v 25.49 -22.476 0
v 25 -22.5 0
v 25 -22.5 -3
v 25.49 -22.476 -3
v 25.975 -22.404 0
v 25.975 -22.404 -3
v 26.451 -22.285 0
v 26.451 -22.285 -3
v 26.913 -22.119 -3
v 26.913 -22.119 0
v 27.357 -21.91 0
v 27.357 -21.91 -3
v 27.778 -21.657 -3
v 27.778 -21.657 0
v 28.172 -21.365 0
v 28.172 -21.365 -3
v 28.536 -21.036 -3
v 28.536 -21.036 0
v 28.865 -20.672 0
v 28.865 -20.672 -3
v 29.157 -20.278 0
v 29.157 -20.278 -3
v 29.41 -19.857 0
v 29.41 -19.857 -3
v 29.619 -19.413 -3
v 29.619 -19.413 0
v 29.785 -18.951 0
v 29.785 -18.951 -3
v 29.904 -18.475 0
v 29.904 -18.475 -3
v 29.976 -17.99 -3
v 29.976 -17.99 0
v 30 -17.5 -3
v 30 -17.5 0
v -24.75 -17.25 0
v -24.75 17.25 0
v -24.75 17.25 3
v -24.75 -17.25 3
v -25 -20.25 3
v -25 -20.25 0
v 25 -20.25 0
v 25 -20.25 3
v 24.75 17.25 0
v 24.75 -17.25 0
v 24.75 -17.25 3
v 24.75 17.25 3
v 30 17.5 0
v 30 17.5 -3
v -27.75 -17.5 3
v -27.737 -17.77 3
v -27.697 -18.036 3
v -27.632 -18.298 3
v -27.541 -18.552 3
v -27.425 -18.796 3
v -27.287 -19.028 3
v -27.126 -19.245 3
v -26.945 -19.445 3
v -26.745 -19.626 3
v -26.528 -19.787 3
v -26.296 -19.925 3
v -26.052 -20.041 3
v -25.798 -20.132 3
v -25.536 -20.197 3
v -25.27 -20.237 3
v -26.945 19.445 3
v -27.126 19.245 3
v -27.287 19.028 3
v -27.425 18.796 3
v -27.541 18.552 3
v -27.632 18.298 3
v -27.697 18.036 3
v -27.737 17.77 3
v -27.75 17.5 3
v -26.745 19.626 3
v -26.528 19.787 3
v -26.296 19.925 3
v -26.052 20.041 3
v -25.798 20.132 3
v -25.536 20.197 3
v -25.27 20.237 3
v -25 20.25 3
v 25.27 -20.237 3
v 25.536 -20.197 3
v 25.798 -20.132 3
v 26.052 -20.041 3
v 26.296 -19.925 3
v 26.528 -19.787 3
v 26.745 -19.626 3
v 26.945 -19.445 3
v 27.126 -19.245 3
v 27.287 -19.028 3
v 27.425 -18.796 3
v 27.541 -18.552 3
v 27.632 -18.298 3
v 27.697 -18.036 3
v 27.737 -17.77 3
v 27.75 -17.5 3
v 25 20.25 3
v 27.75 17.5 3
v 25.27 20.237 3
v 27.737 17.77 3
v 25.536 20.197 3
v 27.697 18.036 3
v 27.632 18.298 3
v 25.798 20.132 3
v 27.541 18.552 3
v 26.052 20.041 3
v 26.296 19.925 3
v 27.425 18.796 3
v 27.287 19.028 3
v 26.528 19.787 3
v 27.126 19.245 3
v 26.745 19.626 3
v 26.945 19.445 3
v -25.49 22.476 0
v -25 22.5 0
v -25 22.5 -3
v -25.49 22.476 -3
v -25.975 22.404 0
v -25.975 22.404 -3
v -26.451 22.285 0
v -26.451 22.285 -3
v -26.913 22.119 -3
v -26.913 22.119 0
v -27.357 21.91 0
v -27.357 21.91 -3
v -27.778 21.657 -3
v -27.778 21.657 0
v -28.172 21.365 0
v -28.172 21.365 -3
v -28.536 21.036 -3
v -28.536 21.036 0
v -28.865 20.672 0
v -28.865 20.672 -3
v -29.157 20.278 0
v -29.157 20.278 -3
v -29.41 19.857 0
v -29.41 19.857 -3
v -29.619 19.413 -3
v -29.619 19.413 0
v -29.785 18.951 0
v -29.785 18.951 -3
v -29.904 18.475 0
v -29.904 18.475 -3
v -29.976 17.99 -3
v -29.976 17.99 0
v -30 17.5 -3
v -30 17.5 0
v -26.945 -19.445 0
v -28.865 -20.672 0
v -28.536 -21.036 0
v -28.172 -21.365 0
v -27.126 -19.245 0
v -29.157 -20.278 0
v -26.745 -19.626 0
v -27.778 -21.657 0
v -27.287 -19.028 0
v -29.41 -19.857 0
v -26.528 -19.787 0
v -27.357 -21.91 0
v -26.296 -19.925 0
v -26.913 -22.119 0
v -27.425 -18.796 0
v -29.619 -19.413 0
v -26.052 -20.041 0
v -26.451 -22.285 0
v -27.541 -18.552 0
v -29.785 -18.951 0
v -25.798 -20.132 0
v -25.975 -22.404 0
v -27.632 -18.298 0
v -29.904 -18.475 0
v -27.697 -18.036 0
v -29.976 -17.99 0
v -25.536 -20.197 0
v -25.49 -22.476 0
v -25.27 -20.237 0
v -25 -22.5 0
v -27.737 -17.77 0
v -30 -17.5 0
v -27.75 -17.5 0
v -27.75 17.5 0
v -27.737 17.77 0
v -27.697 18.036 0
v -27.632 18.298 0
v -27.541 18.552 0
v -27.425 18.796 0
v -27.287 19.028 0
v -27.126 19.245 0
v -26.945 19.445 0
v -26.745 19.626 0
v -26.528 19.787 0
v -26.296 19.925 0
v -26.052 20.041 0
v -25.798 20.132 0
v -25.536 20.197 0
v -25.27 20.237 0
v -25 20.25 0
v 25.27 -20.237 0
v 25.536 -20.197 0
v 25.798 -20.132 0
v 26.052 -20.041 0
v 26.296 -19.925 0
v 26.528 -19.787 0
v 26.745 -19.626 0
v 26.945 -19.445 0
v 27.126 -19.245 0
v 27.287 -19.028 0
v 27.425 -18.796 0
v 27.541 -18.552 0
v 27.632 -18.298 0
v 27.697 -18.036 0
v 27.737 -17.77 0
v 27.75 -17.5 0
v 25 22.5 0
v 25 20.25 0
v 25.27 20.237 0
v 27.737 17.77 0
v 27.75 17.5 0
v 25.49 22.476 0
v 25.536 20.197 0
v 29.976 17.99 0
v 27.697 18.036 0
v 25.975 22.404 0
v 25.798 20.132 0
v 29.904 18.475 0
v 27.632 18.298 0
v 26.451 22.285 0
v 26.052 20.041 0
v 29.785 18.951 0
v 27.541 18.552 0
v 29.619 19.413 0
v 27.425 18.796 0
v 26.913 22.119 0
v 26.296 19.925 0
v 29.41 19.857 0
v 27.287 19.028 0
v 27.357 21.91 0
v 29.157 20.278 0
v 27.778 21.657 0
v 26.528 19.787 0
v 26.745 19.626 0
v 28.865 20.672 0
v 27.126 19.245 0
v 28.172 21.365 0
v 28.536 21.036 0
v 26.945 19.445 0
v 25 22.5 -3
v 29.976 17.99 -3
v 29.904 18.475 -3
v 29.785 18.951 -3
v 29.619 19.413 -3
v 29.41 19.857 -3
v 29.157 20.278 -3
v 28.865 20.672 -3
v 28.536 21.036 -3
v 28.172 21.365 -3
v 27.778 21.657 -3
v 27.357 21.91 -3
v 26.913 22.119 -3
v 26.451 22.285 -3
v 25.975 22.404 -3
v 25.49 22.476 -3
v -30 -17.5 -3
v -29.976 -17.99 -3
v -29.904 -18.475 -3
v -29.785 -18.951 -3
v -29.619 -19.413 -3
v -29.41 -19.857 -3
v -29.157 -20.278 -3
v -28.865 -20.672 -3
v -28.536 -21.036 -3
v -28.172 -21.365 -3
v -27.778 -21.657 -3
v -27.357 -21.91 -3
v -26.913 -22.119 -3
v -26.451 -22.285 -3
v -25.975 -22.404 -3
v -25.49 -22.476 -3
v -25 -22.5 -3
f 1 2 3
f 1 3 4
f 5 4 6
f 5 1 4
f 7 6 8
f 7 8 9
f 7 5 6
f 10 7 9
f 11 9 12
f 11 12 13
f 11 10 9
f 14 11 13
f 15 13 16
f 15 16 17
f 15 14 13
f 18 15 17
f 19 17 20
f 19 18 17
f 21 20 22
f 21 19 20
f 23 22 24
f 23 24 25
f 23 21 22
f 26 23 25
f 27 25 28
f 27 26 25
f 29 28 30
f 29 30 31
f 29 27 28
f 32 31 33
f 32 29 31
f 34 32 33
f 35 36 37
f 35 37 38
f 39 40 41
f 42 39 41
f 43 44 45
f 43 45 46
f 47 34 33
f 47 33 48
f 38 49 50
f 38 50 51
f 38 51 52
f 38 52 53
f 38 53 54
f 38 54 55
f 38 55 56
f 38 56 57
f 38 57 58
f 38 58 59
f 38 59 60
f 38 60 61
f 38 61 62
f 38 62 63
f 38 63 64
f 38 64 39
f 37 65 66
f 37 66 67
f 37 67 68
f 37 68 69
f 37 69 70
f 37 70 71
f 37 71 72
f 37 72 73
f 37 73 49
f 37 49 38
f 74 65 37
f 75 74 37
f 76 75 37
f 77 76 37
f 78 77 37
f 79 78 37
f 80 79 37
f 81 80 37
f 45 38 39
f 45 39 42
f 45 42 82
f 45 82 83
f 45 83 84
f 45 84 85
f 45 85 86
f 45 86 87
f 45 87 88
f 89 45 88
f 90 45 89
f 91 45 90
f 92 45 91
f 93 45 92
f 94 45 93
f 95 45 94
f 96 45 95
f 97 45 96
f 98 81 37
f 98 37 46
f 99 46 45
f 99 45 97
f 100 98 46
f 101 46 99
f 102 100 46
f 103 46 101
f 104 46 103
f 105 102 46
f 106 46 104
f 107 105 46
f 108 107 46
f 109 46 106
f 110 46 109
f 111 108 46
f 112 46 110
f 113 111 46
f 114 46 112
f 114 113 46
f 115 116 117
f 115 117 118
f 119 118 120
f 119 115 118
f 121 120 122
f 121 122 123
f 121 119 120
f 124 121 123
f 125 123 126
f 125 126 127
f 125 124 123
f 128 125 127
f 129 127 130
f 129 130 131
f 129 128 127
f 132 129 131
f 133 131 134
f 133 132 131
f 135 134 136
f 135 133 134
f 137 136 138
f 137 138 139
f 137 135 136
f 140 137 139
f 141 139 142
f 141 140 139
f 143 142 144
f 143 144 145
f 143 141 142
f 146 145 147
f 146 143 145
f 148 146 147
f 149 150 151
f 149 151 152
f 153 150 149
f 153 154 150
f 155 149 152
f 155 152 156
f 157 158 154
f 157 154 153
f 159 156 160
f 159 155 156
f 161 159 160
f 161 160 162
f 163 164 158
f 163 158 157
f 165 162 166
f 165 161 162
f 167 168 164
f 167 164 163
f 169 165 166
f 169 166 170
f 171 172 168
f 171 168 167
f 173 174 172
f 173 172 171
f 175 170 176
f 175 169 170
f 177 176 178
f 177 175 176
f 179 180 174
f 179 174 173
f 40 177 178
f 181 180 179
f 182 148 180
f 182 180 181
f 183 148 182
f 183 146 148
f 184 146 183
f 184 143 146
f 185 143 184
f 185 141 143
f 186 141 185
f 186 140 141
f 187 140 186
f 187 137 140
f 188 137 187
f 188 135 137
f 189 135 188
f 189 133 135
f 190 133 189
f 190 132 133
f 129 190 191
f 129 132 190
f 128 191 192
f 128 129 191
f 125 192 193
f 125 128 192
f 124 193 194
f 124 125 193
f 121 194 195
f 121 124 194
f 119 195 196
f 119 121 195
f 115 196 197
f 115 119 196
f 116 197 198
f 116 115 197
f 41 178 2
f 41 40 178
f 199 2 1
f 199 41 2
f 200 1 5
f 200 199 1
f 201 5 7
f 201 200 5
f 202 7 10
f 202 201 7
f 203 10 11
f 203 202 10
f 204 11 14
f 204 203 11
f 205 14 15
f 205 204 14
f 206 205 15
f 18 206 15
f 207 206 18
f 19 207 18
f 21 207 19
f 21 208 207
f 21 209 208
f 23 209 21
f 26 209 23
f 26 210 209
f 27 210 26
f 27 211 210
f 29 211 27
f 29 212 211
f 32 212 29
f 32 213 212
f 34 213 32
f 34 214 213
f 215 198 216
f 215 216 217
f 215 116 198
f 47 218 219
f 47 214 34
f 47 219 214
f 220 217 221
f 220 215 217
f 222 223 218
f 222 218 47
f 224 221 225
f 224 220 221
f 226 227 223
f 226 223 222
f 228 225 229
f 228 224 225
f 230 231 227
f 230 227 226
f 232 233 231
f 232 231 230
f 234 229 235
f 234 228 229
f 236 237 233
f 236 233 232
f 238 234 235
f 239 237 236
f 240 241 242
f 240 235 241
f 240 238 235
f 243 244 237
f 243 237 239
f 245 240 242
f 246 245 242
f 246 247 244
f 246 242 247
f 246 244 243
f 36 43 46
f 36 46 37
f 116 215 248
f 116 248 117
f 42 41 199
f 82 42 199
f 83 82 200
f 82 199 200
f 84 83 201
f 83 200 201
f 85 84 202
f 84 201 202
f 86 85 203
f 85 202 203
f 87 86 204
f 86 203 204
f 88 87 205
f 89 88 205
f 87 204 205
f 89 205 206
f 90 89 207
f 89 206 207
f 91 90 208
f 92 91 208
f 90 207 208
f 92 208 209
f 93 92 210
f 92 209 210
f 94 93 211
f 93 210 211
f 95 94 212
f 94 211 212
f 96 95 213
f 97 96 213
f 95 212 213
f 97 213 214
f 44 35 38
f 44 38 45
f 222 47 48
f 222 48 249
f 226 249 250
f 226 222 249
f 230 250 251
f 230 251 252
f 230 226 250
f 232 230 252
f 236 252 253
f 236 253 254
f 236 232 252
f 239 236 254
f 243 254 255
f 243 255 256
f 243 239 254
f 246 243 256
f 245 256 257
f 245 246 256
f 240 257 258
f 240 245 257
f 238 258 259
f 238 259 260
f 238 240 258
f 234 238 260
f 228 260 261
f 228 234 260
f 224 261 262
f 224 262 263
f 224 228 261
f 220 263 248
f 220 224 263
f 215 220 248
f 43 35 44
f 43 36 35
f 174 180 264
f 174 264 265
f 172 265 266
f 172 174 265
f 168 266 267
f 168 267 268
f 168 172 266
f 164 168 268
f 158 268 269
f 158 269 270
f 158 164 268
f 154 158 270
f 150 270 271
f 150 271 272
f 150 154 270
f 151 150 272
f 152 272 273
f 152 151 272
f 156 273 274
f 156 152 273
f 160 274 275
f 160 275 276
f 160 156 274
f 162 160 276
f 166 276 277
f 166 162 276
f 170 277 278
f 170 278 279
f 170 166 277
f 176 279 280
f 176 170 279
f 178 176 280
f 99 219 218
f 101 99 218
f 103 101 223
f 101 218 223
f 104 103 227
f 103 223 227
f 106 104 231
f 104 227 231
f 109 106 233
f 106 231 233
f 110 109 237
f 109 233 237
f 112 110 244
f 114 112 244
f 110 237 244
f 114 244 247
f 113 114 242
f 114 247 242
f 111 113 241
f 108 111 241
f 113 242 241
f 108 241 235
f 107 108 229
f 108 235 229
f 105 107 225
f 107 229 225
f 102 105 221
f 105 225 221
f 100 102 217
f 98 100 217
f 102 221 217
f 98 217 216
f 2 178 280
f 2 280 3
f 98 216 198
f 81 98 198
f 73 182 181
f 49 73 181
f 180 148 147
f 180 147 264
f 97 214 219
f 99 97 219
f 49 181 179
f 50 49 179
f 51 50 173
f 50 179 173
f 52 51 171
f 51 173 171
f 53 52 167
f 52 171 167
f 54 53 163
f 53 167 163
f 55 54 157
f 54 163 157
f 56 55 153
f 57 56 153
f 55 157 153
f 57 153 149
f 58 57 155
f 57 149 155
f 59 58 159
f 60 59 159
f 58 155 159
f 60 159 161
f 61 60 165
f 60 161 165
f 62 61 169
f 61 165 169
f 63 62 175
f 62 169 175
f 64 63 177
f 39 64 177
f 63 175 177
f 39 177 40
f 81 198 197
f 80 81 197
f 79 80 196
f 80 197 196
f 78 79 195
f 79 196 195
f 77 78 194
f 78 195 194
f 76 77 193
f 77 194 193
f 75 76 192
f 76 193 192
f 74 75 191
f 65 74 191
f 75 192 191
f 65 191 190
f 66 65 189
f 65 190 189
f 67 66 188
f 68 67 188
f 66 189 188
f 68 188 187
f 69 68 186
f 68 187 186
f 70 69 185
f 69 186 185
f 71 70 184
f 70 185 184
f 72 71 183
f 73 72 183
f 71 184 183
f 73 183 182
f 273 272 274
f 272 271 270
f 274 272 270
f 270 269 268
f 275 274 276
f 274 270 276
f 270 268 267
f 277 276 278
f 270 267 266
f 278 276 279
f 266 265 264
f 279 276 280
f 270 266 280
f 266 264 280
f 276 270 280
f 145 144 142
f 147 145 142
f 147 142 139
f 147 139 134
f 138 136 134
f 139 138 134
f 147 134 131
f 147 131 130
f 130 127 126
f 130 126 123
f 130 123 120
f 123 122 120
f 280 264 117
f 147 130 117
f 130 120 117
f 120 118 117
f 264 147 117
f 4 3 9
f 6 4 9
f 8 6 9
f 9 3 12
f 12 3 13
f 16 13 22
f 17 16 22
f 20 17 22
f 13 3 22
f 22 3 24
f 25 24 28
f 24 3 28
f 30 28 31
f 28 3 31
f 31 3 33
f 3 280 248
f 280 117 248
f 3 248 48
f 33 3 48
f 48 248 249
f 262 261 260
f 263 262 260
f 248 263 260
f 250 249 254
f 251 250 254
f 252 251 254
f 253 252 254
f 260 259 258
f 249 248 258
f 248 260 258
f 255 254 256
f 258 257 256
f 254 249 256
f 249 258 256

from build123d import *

# Parameters (mm, degrees)
F1_DEPTH = 3
F3_DEPTH = 3
F4_T     = -3


with BuildPart() as f1:
    # F0 (on Top) → F1 (new body)
    with BuildSketch(Plane.XY):
        with BuildLine():
            Line((27.75, -17.5), (27.75, 17.5))
            ThreePointArc((27.75, 17.5), (26.9445436483, 19.4445436483), (25, 20.25))
            Line((25, 20.25), (-25, 20.25))
            ThreePointArc((-25, 20.25), (-26.9445436483, 19.4445436483), (-27.75, 17.5))
            Line((-27.75, 17.5), (-27.75, -17.5))
            ThreePointArc((-27.75, -17.5), (-26.9445436483, -19.4445436483), (-25, -20.25))
            Line((-25, -20.25), (25, -20.25))
            ThreePointArc((25, -20.25), (26.9445436483, -19.4445436483), (27.75, -17.5))
        make_face()
    extrude(amount=F1_DEPTH)

    # F2 (on Top) → F3 (join)
    with BuildSketch(Plane.XY):
        with BuildLine():
            Line((-25, -22.5), (10, -22.5))
            Line((10, -22.5), (25, -22.5))
            ThreePointArc((25, -22.5), (28.5355339059, -21.0355339059), (30, -17.5))
            Line((30, -17.5), (30, 17.5))
            ThreePointArc((30, 17.5), (28.5355339059, 21.0355339059), (25, 22.5))
            Line((25, 22.5), (-25, 22.5))
            ThreePointArc((-25, 22.5), (-28.5355339059, 21.0355339059), (-30, 17.5))
            Line((-30, 17.5), (-30, -17.5))
            ThreePointArc((-30, -17.5), (-28.5355339059, -21.0355339059), (-25, -22.5))
        make_face()
    extrude(amount=-F3_DEPTH)

    # F4
    f4_openings = [f1.faces().sort_by_distance(p)[0] for p in [
        (0, 0, 3),
    ]]
    offset(amount=F4_T, openings=f4_openings, kind=Kind.INTERSECTION)


solid = f1.part
